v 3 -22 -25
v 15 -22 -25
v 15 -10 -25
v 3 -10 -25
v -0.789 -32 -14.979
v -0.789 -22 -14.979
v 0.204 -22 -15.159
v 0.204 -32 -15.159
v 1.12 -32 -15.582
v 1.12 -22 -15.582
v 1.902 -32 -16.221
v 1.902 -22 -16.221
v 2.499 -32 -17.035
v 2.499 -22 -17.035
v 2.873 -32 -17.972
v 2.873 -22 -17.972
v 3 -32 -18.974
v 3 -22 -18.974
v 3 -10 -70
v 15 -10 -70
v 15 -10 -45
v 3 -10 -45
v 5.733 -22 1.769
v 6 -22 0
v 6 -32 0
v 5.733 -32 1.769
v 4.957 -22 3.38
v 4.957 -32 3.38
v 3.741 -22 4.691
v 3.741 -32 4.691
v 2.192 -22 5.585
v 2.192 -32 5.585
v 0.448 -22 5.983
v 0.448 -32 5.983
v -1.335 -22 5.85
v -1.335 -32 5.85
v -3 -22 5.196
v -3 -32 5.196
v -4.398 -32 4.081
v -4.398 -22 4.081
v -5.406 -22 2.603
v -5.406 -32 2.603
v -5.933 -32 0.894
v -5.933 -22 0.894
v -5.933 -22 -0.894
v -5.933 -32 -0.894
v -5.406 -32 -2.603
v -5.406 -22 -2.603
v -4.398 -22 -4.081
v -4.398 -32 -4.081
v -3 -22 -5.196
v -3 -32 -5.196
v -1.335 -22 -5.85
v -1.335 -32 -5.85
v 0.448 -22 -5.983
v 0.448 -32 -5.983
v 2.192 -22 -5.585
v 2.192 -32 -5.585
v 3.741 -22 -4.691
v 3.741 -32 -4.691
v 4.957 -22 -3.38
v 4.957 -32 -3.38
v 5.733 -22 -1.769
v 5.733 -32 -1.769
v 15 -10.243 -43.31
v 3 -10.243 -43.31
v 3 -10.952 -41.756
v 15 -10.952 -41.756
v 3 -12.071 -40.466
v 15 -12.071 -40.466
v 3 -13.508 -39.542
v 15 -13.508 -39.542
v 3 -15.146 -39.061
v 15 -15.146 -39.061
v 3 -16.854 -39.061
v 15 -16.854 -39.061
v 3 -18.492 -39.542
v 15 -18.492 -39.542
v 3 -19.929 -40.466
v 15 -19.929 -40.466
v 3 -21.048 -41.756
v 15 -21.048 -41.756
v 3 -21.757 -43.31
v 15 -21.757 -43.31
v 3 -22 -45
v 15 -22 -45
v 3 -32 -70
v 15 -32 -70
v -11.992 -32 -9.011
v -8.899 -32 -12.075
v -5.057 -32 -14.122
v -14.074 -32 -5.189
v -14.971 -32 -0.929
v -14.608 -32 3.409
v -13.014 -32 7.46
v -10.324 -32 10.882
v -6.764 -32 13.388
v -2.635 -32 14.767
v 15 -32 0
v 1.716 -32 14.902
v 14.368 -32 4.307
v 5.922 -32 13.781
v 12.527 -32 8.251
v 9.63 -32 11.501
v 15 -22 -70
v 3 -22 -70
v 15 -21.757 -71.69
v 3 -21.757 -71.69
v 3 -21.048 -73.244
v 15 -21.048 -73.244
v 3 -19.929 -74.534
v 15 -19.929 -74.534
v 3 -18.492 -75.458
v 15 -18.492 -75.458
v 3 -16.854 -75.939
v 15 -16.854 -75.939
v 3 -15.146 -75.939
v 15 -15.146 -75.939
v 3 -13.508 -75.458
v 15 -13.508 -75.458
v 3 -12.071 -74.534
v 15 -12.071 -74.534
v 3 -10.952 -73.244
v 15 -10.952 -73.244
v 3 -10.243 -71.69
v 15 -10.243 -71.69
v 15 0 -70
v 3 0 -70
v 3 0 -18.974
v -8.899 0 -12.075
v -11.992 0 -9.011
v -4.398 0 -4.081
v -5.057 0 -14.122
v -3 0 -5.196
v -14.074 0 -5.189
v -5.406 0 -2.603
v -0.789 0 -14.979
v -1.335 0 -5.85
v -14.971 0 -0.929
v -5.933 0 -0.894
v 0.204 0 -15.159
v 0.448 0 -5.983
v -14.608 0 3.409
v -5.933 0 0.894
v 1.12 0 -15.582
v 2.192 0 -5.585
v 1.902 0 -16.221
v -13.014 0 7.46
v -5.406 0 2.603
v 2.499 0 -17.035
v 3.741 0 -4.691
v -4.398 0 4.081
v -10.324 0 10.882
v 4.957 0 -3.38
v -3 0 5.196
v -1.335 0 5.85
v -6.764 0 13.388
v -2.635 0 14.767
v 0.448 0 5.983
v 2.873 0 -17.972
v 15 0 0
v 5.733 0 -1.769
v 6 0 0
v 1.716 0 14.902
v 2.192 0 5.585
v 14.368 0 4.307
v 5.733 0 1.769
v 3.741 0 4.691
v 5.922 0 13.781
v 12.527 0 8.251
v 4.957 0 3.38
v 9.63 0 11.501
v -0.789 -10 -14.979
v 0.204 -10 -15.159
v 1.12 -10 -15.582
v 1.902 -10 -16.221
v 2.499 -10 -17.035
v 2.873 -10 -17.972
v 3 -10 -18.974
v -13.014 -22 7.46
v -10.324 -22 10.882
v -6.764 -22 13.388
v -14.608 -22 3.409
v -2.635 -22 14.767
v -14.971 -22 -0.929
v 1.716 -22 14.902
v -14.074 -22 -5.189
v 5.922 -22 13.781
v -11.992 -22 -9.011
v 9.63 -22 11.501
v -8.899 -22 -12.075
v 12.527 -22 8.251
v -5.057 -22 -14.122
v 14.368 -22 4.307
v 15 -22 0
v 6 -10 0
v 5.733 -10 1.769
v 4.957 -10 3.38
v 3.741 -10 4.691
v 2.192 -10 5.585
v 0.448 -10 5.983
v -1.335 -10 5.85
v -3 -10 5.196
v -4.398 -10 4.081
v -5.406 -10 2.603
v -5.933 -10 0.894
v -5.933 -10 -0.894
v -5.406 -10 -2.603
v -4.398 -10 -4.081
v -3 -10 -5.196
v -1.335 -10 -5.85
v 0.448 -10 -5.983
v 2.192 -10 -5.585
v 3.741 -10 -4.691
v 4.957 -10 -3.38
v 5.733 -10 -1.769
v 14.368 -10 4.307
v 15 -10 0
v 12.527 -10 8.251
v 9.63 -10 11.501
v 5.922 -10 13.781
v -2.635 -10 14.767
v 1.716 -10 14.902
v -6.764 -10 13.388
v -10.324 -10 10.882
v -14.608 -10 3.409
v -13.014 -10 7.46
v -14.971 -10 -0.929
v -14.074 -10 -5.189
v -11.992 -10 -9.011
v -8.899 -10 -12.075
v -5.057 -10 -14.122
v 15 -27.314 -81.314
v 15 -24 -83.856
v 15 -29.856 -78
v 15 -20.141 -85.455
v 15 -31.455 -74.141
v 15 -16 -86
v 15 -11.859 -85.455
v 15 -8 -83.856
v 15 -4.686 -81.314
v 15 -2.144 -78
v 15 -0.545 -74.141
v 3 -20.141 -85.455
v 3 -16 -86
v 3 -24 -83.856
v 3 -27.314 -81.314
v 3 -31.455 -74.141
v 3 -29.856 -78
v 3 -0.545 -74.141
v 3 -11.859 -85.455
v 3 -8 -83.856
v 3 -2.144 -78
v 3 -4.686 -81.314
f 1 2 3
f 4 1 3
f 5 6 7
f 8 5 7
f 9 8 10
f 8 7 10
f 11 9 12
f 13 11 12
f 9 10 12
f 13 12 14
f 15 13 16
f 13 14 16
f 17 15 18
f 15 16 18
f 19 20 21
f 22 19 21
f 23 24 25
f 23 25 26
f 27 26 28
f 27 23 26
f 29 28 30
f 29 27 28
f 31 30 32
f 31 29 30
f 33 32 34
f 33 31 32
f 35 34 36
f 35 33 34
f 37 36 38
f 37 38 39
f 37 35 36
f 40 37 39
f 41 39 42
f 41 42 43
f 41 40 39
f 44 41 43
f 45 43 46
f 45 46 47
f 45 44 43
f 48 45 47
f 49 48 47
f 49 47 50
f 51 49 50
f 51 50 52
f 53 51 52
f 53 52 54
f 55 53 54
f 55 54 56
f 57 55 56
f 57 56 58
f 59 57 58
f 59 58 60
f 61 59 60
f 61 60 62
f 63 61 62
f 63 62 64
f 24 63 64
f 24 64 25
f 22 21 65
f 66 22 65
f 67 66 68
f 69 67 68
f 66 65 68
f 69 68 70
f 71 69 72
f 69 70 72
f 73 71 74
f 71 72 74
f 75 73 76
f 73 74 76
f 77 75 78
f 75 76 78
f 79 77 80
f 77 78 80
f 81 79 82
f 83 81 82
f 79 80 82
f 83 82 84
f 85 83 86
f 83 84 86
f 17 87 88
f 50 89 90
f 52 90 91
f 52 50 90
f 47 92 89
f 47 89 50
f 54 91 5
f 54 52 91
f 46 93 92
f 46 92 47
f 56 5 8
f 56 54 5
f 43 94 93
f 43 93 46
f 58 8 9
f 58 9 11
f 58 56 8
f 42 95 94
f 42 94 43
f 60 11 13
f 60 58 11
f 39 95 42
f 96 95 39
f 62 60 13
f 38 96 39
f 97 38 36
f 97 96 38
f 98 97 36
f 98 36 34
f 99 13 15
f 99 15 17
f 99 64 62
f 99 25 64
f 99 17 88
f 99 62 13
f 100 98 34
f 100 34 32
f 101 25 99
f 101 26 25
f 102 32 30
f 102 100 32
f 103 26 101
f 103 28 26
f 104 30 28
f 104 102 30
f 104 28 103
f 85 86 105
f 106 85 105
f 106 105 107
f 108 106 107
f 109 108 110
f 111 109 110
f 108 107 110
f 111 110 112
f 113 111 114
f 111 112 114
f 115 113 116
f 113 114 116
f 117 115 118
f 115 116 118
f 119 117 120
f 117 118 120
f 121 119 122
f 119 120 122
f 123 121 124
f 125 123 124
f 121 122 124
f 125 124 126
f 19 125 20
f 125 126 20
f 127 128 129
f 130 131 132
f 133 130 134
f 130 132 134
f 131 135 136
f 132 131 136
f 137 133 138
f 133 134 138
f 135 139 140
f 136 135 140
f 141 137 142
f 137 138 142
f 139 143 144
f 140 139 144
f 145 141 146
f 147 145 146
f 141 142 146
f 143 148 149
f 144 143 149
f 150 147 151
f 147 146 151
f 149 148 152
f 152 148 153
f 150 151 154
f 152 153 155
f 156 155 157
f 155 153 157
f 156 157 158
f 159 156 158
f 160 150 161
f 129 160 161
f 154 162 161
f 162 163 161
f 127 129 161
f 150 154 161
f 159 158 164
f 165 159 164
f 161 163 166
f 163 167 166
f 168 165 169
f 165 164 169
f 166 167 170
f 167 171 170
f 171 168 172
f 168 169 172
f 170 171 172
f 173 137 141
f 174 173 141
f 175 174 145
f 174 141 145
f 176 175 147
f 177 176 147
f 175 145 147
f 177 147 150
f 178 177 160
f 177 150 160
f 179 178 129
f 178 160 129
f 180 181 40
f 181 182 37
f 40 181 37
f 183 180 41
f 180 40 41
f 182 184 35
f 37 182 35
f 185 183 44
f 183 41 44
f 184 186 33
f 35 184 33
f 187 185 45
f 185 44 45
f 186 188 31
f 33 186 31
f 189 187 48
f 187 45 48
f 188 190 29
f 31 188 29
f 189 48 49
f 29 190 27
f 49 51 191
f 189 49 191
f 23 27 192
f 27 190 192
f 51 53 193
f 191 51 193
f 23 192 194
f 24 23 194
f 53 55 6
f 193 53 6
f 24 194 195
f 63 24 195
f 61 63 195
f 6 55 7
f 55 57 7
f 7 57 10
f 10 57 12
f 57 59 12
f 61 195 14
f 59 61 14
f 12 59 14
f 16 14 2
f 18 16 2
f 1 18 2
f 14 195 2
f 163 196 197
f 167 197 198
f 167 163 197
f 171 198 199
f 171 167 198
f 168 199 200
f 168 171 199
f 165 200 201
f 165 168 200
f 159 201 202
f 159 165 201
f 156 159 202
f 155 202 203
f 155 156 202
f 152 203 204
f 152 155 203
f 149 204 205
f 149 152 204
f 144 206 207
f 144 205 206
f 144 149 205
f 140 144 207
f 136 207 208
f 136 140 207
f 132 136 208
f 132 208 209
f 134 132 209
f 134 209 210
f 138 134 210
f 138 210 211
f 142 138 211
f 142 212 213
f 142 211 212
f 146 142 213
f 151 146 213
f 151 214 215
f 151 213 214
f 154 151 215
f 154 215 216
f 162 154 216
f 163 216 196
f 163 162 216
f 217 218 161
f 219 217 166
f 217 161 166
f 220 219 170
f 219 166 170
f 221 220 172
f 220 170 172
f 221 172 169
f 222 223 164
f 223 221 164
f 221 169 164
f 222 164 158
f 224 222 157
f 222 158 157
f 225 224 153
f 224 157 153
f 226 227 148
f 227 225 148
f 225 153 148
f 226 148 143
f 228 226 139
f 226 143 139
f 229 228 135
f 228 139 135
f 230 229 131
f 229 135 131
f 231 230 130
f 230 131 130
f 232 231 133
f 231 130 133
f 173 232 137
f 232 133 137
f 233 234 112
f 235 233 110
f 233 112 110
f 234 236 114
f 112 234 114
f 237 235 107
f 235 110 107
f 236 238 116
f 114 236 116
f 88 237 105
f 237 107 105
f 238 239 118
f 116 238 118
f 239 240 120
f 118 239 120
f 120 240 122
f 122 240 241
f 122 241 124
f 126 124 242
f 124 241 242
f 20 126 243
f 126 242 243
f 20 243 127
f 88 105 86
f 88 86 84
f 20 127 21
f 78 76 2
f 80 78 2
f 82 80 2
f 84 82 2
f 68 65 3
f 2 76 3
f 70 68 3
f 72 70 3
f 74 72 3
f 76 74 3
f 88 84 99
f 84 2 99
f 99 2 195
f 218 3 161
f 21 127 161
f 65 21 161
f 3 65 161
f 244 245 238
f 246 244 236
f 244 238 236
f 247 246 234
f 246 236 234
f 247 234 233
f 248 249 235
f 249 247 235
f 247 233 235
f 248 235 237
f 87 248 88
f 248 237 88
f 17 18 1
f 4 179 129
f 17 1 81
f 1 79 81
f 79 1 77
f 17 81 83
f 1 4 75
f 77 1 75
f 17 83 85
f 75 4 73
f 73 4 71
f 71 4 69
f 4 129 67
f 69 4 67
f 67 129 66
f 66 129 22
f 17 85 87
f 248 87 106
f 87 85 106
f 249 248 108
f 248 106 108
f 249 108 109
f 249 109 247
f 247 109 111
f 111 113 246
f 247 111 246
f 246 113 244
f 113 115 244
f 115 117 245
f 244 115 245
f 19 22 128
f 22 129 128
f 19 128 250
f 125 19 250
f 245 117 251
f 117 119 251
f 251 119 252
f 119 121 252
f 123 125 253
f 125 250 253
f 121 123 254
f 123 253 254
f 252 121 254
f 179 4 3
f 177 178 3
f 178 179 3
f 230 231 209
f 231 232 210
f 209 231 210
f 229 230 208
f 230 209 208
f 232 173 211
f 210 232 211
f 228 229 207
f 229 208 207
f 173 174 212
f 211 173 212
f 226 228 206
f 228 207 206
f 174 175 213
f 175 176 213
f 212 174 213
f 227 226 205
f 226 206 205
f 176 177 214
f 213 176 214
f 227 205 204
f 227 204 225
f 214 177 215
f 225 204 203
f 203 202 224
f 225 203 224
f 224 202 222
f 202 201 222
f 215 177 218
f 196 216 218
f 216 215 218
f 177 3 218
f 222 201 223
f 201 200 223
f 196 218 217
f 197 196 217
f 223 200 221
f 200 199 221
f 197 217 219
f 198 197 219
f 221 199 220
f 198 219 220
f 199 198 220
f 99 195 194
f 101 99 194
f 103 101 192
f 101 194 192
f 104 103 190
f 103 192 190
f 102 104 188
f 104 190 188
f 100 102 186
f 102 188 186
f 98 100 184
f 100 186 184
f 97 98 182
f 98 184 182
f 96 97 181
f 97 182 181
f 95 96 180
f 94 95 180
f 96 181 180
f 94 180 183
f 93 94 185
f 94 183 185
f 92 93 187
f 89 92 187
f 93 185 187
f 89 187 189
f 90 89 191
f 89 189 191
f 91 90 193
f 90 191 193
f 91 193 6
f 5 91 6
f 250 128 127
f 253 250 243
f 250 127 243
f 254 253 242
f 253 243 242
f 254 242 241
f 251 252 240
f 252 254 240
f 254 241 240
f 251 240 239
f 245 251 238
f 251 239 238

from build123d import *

# Parameters (mm, degrees)
F0_R     = 6
F1_DEPTH = 32
F2_W     = 12
F2_H     = 25
F2_H_2   = 15
F3_DEPTH = 30.001


with BuildPart() as f1:
    # F0 (on Front) → F1 (new body)
    with BuildSketch(Plane.XZ):
        with BuildLine():
            Line((15, -86), (15, 0))
            ThreePointArc((15, 0), (-10.323708, 10.882144), (-0.789474, -14.97921))
            ThreePointArc((-0.789474, -14.97921), (1.901905, -16.220677), (3, -18.973666))
            Line((3, -18.973666), (3, -86))
            Line((3, -86), (15, -86))
        make_face()
        Circle(F0_R, mode=Mode.SUBTRACT)
    extrude(amount=F1_DEPTH)

    # F2 (on face) → F3 (cut, through all)
    with BuildSketch(Plane.YZ.offset(15)):
        with BuildLine():
            Line((-22, -45), (-22, -70))
            ThreePointArc((-22, -70), (-16, -76), (-10, -70))
            Line((-10, -70), (-10, -45))
            ThreePointArc((-10, -45), (-16, -39), (-22, -45))
        make_face()
        with Locations((-16, -12.5)):
            Rectangle(F2_W, F2_H)
        with BuildLine():
            ThreePointArc((-16, -86), (-27.313708, -81.313708), (-32, -70))
            Line((-32, -70), (-32, -86))
            Line((-32, -86), (-16, -86))
        make_face()
        with BuildLine():
            Line((0, -86), (0, -70))
            ThreePointArc((0, -70), (-4.686292, -81.313708), (-16, -86))
            Line((-16, -86), (0, -86))
        make_face()
        with Locations((-16, 7.5)):
            Rectangle(F2_W, F2_H_2)
    extrude(amount=-F3_DEPTH, mode=Mode.SUBTRACT)


solid = f1.part
